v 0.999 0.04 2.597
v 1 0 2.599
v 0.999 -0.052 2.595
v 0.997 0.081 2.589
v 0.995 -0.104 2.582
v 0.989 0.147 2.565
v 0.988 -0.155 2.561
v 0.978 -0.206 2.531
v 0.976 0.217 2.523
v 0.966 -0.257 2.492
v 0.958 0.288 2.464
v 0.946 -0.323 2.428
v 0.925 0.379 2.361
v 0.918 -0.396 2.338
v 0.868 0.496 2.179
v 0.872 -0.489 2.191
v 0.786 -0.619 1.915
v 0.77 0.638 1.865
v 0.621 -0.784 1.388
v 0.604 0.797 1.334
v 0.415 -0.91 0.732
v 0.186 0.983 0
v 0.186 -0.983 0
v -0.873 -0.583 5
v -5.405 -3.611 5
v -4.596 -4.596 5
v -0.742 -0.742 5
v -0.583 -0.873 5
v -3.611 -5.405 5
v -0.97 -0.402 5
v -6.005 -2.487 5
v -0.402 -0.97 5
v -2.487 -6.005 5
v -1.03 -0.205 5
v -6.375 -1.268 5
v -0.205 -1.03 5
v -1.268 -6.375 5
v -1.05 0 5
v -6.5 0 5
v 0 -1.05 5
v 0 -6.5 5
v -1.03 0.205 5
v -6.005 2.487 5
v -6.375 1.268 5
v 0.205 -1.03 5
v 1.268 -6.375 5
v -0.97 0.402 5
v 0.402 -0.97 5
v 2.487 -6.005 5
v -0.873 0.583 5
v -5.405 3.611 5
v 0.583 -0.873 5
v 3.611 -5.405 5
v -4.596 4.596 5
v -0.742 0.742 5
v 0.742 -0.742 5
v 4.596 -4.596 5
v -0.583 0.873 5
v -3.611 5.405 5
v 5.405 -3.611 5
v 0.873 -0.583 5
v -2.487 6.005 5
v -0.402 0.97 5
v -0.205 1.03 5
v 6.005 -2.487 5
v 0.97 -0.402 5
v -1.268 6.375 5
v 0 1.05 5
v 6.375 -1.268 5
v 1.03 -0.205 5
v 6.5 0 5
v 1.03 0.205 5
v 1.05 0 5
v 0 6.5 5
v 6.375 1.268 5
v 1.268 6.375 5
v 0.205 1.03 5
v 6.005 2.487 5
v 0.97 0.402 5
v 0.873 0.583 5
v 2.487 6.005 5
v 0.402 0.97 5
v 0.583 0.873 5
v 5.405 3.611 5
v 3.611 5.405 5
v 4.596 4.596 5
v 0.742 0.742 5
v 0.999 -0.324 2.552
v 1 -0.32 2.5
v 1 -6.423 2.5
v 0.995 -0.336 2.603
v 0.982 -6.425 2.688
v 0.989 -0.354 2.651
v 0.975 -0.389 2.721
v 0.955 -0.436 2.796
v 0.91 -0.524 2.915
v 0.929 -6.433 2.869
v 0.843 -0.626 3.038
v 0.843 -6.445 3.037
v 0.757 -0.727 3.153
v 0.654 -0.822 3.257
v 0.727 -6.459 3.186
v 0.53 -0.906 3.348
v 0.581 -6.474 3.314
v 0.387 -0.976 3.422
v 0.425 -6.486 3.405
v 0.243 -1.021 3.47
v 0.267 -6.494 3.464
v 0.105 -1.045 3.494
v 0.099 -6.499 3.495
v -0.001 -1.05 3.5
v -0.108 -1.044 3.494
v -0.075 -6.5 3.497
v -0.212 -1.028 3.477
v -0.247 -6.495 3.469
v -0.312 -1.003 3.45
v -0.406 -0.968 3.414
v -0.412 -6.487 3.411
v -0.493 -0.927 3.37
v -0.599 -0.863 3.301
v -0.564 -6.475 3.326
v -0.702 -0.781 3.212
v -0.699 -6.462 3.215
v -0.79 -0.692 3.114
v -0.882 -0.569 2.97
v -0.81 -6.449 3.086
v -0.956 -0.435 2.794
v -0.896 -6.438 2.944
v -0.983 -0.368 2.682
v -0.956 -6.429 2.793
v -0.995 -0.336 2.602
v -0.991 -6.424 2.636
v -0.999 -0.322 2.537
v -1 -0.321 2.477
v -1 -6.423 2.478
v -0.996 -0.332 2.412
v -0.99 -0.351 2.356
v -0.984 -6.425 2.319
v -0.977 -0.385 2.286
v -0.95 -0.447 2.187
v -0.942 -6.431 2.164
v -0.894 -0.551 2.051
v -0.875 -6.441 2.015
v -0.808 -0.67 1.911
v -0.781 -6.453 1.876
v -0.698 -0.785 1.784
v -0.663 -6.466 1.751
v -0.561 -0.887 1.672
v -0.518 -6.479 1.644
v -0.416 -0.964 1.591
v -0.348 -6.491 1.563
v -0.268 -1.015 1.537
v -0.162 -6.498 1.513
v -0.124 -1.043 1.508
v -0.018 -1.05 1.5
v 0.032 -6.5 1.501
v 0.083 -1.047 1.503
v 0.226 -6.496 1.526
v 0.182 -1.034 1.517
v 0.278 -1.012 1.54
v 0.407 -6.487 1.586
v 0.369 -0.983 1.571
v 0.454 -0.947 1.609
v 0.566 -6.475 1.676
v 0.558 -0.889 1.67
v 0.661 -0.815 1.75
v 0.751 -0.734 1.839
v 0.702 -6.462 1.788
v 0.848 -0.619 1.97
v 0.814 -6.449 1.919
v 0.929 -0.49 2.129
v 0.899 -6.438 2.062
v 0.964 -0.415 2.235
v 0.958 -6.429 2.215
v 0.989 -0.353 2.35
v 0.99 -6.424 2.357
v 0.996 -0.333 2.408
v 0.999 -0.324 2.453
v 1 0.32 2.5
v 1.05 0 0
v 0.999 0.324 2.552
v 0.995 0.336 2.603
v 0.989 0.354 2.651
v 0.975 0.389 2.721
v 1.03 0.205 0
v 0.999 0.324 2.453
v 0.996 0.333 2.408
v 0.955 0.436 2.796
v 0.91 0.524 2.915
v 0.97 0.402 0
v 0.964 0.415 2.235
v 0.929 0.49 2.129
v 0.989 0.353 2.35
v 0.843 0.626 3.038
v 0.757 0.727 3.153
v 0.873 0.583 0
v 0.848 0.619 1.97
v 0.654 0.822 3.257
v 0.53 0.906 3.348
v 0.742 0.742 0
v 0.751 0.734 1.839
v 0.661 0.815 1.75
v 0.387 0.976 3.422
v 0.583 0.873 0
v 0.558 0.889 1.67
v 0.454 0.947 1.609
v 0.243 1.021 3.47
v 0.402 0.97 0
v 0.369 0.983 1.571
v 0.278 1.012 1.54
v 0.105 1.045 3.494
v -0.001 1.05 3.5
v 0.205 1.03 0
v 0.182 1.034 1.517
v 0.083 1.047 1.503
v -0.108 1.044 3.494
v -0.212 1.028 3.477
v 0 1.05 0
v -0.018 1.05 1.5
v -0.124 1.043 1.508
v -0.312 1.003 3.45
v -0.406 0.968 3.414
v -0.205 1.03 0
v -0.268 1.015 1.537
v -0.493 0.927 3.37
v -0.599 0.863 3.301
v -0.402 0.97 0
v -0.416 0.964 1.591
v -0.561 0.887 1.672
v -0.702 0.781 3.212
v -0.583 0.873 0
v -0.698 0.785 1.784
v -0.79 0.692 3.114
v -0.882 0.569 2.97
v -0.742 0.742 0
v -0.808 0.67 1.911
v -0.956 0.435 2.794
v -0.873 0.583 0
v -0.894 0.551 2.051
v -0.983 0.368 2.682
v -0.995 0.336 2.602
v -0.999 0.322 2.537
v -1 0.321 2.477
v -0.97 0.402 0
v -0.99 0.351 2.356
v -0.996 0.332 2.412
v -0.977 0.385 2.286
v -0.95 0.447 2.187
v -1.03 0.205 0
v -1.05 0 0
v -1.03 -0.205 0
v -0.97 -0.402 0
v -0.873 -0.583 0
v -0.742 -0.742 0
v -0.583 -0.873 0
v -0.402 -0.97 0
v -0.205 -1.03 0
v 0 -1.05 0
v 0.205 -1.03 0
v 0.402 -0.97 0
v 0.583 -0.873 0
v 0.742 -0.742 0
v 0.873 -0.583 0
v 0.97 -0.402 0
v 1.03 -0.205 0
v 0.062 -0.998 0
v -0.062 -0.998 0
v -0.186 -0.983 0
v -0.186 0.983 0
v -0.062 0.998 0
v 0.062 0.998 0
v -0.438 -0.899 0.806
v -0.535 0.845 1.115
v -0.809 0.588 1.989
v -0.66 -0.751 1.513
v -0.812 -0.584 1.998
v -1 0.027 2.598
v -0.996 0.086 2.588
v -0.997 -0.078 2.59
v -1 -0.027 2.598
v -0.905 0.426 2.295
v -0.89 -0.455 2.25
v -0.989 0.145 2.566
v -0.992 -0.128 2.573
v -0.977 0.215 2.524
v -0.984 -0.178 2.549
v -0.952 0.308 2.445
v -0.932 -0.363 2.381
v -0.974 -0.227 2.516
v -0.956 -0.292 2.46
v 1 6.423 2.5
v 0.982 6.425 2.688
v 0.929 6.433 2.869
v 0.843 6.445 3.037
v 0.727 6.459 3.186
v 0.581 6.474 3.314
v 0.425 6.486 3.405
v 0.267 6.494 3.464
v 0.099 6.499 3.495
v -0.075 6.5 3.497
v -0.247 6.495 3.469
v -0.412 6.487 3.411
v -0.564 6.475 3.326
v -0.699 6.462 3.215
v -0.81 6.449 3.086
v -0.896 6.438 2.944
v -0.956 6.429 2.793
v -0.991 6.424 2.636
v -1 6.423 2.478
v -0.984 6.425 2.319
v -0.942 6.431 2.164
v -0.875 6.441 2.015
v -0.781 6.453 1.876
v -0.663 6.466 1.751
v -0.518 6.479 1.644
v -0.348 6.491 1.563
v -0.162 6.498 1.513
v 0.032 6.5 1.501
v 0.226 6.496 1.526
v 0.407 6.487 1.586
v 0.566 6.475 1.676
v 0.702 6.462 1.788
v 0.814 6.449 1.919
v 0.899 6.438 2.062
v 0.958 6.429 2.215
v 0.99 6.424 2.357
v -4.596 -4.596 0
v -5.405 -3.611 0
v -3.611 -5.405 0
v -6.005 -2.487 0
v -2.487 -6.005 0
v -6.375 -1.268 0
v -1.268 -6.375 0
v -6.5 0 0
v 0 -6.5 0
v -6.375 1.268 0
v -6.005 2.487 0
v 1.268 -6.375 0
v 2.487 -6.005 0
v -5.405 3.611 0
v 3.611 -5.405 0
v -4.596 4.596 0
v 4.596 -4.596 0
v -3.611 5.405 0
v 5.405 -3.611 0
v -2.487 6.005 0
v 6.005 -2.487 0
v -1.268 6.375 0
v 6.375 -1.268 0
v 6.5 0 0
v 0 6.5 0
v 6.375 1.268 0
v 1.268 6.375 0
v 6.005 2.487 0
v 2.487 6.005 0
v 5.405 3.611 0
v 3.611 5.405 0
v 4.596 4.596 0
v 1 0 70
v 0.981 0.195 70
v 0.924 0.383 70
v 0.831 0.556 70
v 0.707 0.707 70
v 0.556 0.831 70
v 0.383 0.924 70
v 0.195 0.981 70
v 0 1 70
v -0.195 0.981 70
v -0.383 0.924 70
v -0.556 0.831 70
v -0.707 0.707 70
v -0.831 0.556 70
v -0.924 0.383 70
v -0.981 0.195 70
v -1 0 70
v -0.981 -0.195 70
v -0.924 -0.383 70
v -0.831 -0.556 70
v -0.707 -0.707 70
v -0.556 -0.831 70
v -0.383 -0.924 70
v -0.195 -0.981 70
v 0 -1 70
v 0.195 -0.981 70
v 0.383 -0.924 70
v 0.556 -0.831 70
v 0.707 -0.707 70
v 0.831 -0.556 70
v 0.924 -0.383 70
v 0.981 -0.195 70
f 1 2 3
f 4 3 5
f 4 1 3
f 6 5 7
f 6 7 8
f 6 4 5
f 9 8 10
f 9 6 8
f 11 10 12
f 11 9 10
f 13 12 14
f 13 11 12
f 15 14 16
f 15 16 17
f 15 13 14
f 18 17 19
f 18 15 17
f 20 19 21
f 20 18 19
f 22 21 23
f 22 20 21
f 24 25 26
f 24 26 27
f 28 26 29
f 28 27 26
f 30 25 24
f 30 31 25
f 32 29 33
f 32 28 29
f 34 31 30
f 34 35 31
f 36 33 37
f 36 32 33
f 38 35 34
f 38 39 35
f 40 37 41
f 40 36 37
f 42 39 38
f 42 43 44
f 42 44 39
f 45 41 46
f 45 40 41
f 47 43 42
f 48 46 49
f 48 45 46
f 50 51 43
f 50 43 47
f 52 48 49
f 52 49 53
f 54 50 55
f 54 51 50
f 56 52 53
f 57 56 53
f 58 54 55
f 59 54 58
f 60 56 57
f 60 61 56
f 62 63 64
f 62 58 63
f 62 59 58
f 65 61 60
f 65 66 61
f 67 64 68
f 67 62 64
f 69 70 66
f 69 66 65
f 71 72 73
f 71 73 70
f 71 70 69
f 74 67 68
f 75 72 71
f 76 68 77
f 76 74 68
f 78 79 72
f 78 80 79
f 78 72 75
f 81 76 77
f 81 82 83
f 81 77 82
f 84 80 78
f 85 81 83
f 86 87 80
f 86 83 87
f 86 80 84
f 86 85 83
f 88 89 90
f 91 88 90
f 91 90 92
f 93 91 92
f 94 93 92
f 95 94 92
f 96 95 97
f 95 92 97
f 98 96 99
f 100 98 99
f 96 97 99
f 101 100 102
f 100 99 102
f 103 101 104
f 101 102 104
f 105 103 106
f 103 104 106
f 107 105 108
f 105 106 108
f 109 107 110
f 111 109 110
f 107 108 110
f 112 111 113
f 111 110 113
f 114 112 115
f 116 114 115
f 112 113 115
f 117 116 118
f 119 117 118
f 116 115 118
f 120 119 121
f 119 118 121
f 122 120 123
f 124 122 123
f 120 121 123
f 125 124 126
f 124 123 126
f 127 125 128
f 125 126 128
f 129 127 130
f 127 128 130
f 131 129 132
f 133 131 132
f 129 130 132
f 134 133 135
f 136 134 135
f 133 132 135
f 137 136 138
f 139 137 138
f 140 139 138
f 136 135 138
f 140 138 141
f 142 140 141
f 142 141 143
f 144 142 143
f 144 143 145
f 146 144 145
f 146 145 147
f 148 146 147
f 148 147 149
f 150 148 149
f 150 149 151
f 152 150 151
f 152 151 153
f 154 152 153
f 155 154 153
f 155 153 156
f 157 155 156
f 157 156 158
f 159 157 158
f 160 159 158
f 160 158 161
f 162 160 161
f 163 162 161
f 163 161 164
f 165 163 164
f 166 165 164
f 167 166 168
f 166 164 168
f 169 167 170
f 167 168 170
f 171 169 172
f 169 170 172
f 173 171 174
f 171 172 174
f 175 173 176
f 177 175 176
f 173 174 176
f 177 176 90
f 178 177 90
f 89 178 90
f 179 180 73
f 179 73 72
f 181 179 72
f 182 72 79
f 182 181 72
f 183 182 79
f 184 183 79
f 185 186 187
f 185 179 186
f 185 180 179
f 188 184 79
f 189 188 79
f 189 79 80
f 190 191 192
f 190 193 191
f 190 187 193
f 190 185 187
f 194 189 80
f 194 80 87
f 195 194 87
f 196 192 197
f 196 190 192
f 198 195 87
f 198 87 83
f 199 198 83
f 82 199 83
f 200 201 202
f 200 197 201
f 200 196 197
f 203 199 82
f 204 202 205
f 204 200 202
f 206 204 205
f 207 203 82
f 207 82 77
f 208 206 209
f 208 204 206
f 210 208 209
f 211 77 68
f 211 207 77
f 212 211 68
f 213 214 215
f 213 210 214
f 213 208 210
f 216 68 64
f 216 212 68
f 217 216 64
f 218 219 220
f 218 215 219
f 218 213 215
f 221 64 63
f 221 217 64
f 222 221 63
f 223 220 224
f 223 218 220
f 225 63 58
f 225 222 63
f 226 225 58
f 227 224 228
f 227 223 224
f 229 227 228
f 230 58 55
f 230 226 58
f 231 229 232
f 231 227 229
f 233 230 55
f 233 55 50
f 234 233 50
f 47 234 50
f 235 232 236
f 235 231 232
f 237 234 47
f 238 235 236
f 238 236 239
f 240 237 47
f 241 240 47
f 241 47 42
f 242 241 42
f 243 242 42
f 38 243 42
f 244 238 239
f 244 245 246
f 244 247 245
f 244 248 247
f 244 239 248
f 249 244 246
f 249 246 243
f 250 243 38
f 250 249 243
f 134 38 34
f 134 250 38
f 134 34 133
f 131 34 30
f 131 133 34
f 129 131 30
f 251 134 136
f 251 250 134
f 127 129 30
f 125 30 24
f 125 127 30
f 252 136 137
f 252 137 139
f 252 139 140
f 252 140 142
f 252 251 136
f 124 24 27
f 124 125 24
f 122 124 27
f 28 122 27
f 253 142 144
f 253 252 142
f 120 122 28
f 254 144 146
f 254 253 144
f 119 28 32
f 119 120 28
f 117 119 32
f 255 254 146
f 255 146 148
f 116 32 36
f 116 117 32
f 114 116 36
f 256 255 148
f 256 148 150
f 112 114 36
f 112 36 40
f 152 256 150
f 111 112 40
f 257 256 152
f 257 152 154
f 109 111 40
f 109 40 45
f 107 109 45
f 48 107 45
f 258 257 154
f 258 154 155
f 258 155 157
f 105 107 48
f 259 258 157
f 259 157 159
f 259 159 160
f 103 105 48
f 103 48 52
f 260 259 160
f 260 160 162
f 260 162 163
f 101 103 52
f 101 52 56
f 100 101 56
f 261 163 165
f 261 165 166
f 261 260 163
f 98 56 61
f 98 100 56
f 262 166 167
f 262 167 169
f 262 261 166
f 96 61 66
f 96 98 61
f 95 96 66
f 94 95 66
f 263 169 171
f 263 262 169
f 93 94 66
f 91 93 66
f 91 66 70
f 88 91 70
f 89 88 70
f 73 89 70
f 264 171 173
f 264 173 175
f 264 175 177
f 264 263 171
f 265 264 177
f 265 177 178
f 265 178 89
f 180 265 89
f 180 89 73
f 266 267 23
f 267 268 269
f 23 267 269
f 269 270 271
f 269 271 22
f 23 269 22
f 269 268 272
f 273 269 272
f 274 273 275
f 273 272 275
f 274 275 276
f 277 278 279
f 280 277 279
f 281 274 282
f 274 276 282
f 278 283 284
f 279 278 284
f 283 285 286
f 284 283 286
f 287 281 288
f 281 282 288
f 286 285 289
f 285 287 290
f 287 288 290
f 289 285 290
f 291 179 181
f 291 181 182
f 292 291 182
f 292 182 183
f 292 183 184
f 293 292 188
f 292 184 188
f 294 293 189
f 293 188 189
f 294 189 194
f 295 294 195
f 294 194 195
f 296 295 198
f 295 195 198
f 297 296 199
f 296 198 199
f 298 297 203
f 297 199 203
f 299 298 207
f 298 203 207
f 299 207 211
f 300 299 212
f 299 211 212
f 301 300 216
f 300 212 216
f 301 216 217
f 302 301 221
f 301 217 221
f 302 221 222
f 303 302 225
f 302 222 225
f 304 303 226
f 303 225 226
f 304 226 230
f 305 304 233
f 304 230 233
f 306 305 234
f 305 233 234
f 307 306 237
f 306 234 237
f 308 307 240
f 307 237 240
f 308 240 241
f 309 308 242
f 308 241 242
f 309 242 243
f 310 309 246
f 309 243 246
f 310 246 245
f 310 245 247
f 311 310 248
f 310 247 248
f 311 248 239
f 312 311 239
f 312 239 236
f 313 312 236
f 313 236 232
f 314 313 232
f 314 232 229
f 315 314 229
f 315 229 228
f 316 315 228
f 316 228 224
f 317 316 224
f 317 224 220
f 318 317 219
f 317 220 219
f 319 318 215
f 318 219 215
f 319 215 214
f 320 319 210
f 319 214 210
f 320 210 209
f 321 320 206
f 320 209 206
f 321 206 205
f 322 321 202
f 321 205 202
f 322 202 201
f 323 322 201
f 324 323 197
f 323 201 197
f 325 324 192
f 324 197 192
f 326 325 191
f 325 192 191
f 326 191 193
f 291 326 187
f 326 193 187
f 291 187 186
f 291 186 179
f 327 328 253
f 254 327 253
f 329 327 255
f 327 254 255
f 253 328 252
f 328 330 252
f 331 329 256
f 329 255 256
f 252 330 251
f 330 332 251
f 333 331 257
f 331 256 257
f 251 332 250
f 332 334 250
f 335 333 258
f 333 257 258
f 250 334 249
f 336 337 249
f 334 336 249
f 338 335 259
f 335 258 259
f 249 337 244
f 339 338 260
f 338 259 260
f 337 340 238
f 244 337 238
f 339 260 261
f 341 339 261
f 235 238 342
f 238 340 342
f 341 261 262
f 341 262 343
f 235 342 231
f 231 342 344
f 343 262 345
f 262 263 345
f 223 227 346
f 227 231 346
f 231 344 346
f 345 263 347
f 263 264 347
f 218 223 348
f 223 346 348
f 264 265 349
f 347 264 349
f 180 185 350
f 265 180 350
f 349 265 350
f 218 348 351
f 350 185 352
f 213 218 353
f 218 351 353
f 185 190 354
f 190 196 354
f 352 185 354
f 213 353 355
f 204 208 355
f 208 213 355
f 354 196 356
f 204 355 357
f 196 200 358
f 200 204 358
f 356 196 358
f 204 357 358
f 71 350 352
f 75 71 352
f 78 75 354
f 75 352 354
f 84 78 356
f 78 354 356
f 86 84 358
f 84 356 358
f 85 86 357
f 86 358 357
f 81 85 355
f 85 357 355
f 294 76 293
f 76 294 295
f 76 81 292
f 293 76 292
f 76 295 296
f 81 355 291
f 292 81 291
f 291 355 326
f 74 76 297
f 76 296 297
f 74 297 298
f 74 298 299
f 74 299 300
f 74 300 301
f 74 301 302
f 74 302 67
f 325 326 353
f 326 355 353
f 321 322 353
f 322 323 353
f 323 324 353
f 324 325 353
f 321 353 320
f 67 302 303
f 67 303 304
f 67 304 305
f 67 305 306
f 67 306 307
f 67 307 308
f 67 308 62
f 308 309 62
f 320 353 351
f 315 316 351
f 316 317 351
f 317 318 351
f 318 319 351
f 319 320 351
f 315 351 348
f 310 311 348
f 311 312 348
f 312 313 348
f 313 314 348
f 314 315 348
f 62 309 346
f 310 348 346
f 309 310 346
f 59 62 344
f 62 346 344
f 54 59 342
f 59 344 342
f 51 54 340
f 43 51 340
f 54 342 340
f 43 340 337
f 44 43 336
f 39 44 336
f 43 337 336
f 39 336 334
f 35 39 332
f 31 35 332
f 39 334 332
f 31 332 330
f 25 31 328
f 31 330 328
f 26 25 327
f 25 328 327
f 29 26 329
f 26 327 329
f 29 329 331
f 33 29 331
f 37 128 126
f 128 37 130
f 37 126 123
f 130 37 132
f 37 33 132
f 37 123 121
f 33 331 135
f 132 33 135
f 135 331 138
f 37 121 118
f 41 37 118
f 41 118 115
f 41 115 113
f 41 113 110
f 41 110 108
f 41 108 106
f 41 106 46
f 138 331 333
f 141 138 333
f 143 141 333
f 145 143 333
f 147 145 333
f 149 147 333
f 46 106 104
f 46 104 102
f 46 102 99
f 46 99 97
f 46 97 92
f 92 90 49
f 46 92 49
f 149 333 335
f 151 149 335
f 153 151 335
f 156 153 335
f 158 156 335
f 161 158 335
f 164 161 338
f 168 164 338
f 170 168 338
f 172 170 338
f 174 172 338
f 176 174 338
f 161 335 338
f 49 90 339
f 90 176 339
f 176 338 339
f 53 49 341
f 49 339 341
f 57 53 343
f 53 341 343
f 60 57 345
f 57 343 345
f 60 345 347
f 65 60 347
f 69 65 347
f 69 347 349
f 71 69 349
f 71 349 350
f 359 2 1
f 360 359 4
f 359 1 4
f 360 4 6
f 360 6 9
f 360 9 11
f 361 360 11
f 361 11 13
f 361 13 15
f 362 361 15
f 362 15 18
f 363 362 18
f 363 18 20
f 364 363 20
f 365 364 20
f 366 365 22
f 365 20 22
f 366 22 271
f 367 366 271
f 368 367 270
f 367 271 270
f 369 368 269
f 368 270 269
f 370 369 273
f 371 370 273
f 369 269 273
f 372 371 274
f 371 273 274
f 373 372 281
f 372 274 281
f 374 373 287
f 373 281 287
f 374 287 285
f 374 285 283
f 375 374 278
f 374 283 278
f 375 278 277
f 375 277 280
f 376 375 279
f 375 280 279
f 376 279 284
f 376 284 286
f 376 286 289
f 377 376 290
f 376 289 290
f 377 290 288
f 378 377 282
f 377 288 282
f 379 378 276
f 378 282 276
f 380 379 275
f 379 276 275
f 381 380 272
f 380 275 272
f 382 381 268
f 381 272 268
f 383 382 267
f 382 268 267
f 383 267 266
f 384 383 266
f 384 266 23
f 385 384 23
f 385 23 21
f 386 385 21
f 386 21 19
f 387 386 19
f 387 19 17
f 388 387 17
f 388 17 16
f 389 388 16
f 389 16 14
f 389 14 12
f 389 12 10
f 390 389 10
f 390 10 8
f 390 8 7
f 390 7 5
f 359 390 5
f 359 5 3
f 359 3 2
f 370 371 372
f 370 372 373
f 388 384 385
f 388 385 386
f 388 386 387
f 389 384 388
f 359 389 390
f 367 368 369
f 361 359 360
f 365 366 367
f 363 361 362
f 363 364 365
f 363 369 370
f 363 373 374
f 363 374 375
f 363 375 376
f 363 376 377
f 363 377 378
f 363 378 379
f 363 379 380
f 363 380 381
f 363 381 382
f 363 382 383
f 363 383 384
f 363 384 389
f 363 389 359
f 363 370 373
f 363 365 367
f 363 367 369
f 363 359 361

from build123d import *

# Parameters (mm, degrees)
F0_R     = 1
F1_DEPTH = 70
F3_DEPTH = 12.5
F4_R     = 6.5
F4_R_2   = 1.05
F5_DEPTH = 5
F6_R     = 1
F7_DEPTH = 12.5


with BuildPart() as f1:
    # F0 (on Top) → F1 (new body)
    with BuildSketch(Plane.XY):
        Circle(F0_R)
    extrude(amount=F1_DEPTH)

    # F2 (on Front) → F3 (cut, symmetric)
    with BuildSketch(Plane.XZ):
        Polygon((1.154513564, 3.092951607), (0.1861076162, 0), (1.154513564, 0), align=None)
        Polygon((-1.154513564, 0), (-0.1861076162, 0), (-1.154513564, 3.092951607), align=None)
    extrude(amount=F3_DEPTH, both=True, mode=Mode.SUBTRACT)


with BuildPart() as f5:
    # F4 (on Top) → F5 (new body)
    with BuildSketch(Plane.XY):
        Circle(F4_R)
        Circle(F4_R_2, mode=Mode.SUBTRACT)
    extrude(amount=F5_DEPTH)

    # F6 (on Front) → F7 (cut, symmetric)
    with BuildSketch(Plane.XZ):
        with Locations((0, 2.5)):
            Circle(F6_R)
    extrude(amount=F7_DEPTH, both=True, mode=Mode.SUBTRACT)


solid = Compound([f1.part, f5.part])
